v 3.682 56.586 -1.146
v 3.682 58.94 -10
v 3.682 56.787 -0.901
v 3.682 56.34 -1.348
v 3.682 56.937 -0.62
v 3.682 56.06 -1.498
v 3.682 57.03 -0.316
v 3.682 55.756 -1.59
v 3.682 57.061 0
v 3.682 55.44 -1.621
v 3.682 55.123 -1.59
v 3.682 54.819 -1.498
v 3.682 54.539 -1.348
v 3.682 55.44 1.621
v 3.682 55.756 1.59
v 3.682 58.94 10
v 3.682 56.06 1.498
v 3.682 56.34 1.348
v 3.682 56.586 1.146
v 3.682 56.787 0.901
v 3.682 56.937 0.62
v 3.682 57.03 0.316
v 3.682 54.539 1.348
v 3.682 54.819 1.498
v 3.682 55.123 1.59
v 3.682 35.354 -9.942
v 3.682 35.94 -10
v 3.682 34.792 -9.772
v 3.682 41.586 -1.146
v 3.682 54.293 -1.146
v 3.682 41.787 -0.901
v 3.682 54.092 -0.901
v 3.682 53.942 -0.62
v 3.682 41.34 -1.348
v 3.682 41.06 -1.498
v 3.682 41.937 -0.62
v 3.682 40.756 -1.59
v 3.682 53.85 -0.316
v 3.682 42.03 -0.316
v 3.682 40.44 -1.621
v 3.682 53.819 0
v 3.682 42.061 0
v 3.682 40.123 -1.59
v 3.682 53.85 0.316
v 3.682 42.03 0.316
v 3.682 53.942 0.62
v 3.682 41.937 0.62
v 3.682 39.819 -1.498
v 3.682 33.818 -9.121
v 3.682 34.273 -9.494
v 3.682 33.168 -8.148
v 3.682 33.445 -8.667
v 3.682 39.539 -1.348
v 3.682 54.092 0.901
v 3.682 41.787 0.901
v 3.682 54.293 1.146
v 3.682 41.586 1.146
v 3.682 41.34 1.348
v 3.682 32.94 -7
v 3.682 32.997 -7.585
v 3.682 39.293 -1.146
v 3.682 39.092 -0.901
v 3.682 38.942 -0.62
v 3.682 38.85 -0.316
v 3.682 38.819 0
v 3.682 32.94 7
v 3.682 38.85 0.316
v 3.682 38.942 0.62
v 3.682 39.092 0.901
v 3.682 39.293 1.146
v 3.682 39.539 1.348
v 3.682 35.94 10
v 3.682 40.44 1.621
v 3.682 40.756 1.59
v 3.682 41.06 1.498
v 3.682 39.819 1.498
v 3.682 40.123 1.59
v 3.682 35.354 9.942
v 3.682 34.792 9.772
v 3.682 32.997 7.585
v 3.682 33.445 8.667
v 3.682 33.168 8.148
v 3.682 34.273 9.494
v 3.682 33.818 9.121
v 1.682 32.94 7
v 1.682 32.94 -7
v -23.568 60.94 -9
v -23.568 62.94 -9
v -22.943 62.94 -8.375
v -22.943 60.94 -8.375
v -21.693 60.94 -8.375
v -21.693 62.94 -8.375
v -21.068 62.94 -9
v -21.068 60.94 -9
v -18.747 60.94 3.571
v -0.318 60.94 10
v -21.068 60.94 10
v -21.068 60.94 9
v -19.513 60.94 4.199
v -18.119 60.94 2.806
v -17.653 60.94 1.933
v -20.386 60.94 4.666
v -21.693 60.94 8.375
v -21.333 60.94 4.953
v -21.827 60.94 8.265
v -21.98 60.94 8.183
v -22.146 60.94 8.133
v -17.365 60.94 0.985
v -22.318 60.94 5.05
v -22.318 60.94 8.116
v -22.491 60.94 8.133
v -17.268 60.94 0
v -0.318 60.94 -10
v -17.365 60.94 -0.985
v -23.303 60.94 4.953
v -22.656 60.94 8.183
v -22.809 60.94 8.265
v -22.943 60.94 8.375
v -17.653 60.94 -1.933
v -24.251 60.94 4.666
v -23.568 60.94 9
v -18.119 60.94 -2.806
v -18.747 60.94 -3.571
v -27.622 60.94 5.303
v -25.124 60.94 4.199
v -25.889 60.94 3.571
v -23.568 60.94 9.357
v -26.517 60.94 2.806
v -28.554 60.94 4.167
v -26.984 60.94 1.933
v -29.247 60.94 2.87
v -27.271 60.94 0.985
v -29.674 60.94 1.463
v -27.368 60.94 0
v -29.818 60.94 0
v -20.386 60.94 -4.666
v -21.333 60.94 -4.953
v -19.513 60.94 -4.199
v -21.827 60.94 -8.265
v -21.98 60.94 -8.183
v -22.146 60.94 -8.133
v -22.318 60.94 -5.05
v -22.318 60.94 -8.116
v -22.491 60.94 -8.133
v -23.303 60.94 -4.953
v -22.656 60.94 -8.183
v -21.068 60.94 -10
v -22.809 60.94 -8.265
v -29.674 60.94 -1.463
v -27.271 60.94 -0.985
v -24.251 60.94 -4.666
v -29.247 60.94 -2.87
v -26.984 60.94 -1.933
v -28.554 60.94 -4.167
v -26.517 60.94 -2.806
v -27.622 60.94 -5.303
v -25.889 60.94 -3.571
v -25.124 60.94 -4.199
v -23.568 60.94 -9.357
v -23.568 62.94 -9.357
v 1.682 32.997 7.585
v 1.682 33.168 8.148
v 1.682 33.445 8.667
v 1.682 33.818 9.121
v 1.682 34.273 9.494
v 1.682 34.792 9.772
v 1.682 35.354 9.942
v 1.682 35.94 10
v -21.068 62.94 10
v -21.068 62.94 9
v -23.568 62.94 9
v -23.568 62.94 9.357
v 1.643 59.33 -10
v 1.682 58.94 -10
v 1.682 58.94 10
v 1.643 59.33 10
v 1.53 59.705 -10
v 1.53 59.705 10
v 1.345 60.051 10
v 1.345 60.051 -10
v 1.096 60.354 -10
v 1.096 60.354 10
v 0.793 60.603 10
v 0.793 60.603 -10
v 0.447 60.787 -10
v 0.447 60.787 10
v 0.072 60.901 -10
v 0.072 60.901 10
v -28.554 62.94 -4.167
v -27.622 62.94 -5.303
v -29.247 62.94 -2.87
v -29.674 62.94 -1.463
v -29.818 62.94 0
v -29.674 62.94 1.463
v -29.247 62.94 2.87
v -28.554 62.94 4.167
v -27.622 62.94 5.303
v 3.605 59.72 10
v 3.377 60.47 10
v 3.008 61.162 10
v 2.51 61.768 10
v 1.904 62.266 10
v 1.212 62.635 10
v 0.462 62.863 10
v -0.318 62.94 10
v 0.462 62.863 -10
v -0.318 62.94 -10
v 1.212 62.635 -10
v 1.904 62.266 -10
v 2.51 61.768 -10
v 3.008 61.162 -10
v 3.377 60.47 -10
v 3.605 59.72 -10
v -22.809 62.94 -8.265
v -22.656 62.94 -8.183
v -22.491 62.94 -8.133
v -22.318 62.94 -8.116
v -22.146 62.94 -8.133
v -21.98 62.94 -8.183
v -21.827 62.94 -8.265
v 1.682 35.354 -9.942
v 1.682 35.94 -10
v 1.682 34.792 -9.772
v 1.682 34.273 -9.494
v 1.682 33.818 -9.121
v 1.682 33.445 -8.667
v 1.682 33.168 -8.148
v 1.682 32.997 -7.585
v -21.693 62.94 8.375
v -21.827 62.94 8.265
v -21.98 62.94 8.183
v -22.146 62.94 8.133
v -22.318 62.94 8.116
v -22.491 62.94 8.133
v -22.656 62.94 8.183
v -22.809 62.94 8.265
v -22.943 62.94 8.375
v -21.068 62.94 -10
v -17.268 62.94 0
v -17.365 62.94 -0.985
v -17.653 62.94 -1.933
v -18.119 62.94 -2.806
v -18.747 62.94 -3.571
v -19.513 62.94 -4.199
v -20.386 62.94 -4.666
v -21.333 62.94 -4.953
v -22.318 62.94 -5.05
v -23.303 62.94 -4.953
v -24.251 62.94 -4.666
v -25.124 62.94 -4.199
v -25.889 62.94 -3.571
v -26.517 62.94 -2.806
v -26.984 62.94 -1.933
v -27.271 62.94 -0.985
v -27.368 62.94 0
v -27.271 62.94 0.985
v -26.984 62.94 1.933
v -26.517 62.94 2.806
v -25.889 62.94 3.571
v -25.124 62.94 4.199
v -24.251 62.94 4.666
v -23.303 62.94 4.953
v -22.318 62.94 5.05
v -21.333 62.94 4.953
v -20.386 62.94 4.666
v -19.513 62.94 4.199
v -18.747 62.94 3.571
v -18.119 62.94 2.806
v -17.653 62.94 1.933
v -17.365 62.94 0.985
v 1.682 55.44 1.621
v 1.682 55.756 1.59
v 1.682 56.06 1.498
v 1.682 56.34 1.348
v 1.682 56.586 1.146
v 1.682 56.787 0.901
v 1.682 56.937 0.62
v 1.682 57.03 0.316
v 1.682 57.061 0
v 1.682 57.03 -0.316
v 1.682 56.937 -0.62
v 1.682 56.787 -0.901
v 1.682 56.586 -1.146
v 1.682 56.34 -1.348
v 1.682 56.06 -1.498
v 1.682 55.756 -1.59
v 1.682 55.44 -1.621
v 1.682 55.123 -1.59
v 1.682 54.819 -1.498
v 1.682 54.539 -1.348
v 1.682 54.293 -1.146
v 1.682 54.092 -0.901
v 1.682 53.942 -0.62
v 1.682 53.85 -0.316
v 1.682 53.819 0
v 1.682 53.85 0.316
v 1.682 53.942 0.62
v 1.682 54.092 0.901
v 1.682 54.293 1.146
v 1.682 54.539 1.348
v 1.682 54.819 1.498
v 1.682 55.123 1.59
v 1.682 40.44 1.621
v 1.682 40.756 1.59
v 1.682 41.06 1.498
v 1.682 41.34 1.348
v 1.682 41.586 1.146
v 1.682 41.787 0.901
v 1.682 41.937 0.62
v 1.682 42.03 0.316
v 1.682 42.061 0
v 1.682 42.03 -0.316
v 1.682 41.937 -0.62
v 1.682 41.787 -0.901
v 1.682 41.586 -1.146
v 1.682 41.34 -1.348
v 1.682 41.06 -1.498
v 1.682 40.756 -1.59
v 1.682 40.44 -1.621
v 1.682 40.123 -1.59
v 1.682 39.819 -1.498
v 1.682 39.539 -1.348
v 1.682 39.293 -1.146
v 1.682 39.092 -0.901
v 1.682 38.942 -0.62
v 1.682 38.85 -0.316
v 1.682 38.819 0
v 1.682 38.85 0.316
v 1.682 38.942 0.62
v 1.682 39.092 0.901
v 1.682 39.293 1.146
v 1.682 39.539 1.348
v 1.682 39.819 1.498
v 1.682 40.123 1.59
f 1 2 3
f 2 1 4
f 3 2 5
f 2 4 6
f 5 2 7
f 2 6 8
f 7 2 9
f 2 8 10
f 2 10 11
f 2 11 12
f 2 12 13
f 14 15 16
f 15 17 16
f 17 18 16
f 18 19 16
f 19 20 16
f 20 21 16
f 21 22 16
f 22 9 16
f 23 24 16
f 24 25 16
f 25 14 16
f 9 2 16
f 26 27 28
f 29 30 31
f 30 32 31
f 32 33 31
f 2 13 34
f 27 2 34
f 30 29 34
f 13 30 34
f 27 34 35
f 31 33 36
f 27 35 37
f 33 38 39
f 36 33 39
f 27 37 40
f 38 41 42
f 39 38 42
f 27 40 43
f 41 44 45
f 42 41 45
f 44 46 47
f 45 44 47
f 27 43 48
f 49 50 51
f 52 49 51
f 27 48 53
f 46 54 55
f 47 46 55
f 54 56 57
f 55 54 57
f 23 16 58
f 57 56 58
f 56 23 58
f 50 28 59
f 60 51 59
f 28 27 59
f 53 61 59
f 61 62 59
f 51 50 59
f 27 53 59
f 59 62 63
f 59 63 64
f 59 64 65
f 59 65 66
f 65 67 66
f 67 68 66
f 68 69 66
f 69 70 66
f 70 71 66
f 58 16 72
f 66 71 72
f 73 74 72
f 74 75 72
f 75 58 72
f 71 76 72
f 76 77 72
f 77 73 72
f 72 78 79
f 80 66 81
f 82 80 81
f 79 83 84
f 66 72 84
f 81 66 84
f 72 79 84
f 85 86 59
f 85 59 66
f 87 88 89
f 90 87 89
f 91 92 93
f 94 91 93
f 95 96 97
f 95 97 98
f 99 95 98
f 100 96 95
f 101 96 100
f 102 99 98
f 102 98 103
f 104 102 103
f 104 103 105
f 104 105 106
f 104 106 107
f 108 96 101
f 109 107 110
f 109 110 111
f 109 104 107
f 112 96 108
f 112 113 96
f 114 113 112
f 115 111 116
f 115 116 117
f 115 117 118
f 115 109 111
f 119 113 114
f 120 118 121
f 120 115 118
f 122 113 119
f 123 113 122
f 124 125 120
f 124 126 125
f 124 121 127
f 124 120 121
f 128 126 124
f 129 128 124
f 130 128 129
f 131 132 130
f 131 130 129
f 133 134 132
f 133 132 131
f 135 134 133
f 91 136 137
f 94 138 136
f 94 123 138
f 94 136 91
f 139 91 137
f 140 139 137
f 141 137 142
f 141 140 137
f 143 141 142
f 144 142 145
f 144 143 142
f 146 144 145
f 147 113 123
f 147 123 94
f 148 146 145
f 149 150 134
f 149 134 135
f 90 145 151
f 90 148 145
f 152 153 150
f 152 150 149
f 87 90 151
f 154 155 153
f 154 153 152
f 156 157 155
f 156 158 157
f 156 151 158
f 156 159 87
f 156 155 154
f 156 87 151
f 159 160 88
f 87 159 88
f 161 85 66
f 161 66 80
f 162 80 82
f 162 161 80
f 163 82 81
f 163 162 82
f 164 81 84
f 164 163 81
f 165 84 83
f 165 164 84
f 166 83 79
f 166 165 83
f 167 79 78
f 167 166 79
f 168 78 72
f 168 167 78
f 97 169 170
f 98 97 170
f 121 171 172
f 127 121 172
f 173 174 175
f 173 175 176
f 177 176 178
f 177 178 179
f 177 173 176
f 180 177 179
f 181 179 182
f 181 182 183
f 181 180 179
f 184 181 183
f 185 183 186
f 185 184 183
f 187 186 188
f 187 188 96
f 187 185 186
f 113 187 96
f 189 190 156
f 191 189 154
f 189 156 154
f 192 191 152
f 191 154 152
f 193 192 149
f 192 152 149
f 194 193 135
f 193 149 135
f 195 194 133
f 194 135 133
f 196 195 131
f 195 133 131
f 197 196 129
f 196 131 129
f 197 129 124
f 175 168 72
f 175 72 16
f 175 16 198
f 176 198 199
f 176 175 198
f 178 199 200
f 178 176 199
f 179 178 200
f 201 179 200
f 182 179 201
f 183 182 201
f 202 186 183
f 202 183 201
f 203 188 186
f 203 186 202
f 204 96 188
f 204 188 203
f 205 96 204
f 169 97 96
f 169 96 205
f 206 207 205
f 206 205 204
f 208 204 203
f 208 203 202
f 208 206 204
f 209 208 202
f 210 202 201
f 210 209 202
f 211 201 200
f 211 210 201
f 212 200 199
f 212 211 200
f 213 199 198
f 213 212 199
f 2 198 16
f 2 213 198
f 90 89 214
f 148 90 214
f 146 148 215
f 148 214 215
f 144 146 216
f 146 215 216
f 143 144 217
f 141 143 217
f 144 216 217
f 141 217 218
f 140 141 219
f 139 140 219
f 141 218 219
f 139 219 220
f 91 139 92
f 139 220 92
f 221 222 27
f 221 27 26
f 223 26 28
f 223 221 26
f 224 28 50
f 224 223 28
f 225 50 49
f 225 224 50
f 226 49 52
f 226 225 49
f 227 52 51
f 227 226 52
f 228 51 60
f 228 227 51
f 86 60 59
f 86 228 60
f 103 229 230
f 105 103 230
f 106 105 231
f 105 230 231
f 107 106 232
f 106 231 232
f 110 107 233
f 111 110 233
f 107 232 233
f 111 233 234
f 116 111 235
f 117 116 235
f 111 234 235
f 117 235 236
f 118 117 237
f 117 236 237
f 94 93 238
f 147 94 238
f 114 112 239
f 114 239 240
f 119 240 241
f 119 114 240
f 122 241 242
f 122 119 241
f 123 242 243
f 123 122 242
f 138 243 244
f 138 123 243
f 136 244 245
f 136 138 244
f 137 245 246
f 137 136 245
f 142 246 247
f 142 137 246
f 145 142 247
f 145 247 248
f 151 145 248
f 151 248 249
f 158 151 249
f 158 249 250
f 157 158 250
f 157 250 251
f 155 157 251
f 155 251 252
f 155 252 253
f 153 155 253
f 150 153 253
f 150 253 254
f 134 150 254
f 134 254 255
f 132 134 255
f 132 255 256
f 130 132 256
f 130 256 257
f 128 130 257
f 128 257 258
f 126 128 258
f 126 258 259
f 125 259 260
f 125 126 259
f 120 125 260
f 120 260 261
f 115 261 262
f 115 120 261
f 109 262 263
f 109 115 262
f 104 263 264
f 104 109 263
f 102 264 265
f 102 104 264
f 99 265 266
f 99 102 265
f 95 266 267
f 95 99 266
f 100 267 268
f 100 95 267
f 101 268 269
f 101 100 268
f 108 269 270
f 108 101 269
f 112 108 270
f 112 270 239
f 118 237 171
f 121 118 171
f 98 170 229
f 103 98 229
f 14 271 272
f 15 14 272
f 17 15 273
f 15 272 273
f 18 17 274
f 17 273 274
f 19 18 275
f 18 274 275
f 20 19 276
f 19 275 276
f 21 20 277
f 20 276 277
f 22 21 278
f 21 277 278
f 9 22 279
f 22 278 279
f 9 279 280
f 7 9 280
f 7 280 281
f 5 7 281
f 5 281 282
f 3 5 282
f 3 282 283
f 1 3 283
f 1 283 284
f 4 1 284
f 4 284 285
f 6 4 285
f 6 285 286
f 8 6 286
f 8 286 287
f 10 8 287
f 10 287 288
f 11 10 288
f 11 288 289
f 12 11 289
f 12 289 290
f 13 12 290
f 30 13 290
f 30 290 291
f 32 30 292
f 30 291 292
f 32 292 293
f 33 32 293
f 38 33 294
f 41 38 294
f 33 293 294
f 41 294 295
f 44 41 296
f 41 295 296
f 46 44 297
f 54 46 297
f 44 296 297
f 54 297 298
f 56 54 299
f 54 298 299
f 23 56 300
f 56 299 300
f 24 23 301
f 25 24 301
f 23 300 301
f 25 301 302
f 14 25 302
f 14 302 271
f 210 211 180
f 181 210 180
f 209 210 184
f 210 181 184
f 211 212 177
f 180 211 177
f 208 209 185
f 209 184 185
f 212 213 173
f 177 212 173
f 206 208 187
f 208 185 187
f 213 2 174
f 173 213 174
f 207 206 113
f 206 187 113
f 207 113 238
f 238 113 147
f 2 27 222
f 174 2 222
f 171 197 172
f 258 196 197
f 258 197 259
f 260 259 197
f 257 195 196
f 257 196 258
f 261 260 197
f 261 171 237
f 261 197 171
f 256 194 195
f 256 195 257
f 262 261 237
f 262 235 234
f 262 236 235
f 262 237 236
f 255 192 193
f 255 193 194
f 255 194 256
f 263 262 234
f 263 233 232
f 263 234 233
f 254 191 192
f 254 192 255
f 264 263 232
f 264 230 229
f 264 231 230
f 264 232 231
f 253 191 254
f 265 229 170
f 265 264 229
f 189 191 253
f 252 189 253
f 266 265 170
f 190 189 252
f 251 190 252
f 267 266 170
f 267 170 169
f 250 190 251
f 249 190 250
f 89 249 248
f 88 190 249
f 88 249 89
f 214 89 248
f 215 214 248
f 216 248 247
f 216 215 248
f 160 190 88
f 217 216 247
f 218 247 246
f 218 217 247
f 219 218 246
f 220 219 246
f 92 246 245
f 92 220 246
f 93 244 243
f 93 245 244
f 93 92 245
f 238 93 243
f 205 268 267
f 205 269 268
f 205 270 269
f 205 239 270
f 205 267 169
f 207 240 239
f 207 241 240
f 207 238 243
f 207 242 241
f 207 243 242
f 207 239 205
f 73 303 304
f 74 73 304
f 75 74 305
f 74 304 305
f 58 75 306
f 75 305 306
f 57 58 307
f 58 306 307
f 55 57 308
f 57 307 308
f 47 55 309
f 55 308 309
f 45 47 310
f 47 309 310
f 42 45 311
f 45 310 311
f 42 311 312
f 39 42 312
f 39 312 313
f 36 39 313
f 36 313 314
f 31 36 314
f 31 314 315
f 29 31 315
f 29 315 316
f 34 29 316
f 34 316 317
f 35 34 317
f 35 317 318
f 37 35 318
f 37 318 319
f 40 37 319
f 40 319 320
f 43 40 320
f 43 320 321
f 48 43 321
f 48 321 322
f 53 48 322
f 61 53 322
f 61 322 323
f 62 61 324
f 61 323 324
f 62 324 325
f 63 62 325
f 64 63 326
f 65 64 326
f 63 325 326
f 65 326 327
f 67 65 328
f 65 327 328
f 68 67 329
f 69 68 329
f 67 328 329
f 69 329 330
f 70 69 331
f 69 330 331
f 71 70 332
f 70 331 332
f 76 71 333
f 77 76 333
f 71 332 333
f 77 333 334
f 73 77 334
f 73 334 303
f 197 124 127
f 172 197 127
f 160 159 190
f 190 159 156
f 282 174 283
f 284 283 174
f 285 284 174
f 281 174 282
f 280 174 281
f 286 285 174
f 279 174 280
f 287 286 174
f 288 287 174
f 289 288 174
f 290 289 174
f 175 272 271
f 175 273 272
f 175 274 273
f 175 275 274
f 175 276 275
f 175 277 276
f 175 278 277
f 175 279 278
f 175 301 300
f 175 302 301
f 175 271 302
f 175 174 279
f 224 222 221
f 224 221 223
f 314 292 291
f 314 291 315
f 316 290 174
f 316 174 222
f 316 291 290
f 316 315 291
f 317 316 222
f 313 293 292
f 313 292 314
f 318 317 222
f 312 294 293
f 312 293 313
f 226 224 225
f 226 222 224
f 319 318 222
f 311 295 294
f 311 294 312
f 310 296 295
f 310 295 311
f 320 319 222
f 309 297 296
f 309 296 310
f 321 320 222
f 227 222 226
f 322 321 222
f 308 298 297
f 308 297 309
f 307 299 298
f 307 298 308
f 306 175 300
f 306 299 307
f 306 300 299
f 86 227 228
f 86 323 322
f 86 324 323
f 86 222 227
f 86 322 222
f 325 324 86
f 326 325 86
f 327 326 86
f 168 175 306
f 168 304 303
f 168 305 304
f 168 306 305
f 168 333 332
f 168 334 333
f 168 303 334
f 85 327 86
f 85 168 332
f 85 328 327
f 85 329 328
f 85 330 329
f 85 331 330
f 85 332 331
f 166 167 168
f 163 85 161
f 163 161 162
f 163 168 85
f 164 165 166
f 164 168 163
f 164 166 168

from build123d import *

# Parameters (mm, degrees)
BOSS_EXTRUDE1_DEPTH        = 2
M3_CLEARANCE_HOLE1_D       = 3.242
HOLE1_D                    = 10.1
SKETCHED_START             = 62.517190459
SKETCHED_BEND1_OUTLINE_W   = 2
SKETCHED_BEND1_OUTLINE_H   = 20.000000002
SKETCHED_BEND1_DEPTH       = 31.482809541
SKETCHED_START_2           = 60.939670459
SKETCHED_BEND1_2_OUTLINE_R = 5.05
SKETCHED_BEND1_2_DEPTH     = 0.021621314
SKETCHED_START_3           = 58.939670459
SKETCHED_BEND1_3_OUTLINE_R = 5.05
SKETCHED_BEND1_3_DEPTH     = 4
SKETCHED_START_4           = -10.000000001
SKETCHED_BEND1_4_DEPTH     = 20.000000002
CUT_EXTRUDE1_REACH         = 45.464


with BuildPart() as part:
    # Sketch5 → Boss-Extrude1 (new body)
    with BuildSketch(Plane(origin=(1.681750162, 0, 0), x_dir=(0, -1, 0), z_dir=(-1, 0, 0))):
        with BuildLine():
            Line((-35.93967046, 10.000000001), (-86.258661155, 10.000000001))
            Line((-86.258661155, 10.000000001), (-90.955360298, 5.303300858))
            ThreePointArc((-90.955360298, 5.303300858), (-93.152059438, 0), (-90.955360298, -5.303300858))
            Line((-90.955360298, -5.303300858), (-86.258661155, -10.000000001))
            Line((-86.258661155, -10.000000001), (-35.93967046, -10.000000001))
            ThreePointArc((-35.93967046, -10.000000001), (-33.818350116, -9.121320344), (-32.93967046, -7.000000001))
            Line((-32.93967046, -7.000000001), (-32.93967046, 7.000000001))
            ThreePointArc((-32.93967046, 7.000000001), (-33.818350116, 9.121320344), (-35.93967046, 10.000000001))
        make_face()
    extrude(amount=-BOSS_EXTRUDE1_DEPTH)

    # M3 Clearance Hole1 (through all)
    with Locations(Plane(origin=(3.681750162, 0, 0), x_dir=(0, 0, -1), z_dir=(1, 0, 0))):
        with Locations((0, 40.439670459), (0, 55.439670459)):
            Hole(M3_CLEARANCE_HOLE1_D / 2)

    # Hole1 (through all)
    with Locations(Plane.ZY.offset(-1.681750162)):
        with Locations((0, 85.65205944)):
            Hole(HOLE1_D / 2)

    # Sketched Bend1: read off the stored shape, not the designer's step
    # Sketched Bend1 outline → Sketched Bend1 (cut)
    with BuildSketch(Plane(origin=(0, 0, 0), x_dir=(1, 0, 0), z_dir=(0, 1, 0)).offset(SKETCHED_START)):
        with Locations((2.681750162, 0)):
            Rectangle(SKETCHED_BEND1_OUTLINE_W, SKETCHED_BEND1_OUTLINE_H)
    extrude(amount=SKETCHED_BEND1_DEPTH, mode=Mode.SUBTRACT)

    # Sketched Bend1 2 outline → Sketched Bend1 2 (add)
    with BuildSketch(Plane(origin=(0, 0, 0), x_dir=(1, 0, 0), z_dir=(0, 1, 0)).offset(SKETCHED_START_2)):
        with BuildLine():
            Line((1.681750162, 10.000000001), (-22.924851553, 10.000000001))
            Line((-22.924851553, 10.000000001), (-27.621550696, 5.303300858))
            ThreePointArc((-27.621550696, 5.303300858), (-29.818249837, 0), (-27.621550696, -5.303300858))
            Line((-27.621550696, -5.303300858), (-22.924851553, -10.000000001))
            Line((-22.924851553, -10.000000001), (1.681750162, -10.000000001))
            Line((1.681750162, -10.000000001), (1.681750162, 10.000000001))
        make_face()
        with Locations((-22.318249838, 0)):
            Circle(SKETCHED_BEND1_2_OUTLINE_R, mode=Mode.SUBTRACT)
    extrude(amount=SKETCHED_BEND1_2_DEPTH)

    # Sketched Bend1 3 outline → Sketched Bend1 3 (add)
    with BuildSketch(Plane(origin=(0, 0, 0), x_dir=(1, 0, 0), z_dir=(0, 1, 0)).offset(SKETCHED_START_3)):
        with BuildLine():
            Line((1.681750162, 10.000000001), (-22.924851553, 10.000000001))
            Line((-22.924851553, 10.000000001), (-27.621550696, 5.303300858))
            ThreePointArc((-27.621550696, 5.303300858), (-29.818249837, 0), (-27.621550696, -5.303300858))
            Line((-27.621550696, -5.303300858), (-22.924851553, -10.000000001))
            Line((-22.924851553, -10.000000001), (1.681750162, -10.000000001))
            Line((1.681750162, -10.000000001), (1.681750162, 10.000000001))
        make_face()
        with Locations((-22.318249838, 0)):
            Circle(SKETCHED_BEND1_3_OUTLINE_R, mode=Mode.SUBTRACT)
    extrude(amount=SKETCHED_BEND1_3_DEPTH)

    # Sketched Bend1 4 outline → Sketched Bend1 4 (cut)
    with BuildSketch(Plane.XY.offset(SKETCHED_START_4)):
        with BuildLine():
            Line((-0.318249838, 60.939670459), (-31, 60.939670459))
            Line((-31, 60.939670459), (-31, 58.939670459))
            Line((-31, 58.939670459), (1.681750162, 58.939670459))
            ThreePointArc((1.681750162, 58.939670459), (1.095963724, 60.353884021), (-0.318249838, 60.939670459))
        make_face()
        with BuildLine():
            Line((-31, 64), (-31, 62.939670452))
            Line((-31, 62.939670452), (-0.318249838, 62.939670459))
            ThreePointArc((-0.318249838, 62.939670459), (2.510177287, 61.768097584), (3.681750162, 58.939670459))
            Line((3.681750162, 58.939670459), (3.681750162, 62.517190459))
            Line((3.681750162, 62.517190459), (1.681750162, 62.517190459))
            Line((1.681750162, 62.517190459), (1.681750162, 64))
            Line((1.681750162, 64), (-31, 64))
        make_face()
    extrude(amount=SKETCHED_BEND1_4_DEPTH, mode=Mode.SUBTRACT)

    # Sketch15 → Cut-Extrude1 (cut, up to next)
    with BuildSketch(Plane(origin=(0, 62.939670459, 0), x_dir=(1, 0, 0), z_dir=(0, 1, 0)), mode=Mode.PRIVATE) as cut_extrude1_sk1:
        with BuildLine():
            Line((-21.068249838, 9.000000001), (-21.068249838, 10.000000001))
            Line((-21.068249838, 10.000000001), (-22.924851553, 10.000000001))
            Line((-22.924851553, 10.000000001), (-23.568249838, 9.356601716))
            Line((-23.568249838, 9.356601716), (-23.568249838, 9.000000001))
            Line((-23.568249838, 9.000000001), (-22.943249838, 8.375000001))
            ThreePointArc((-22.943249838, 8.375000001), (-22.318249838, 8.116116524), (-21.693249838, 8.375000001))
            Line((-21.693249838, 8.375000001), (-21.068249838, 9.000000001))
        make_face()
    cut_extrude1_tool1 = extrude(cut_extrude1_sk1.sketch, amount=-CUT_EXTRUDE1_REACH, mode=Mode.PRIVATE) & part.part
    # Sketch15 → Cut-Extrude1 (cut, up to next)
    with BuildSketch(Plane(origin=(0, 62.939670459, 0), x_dir=(1, 0, 0), z_dir=(0, 1, 0)), mode=Mode.PRIVATE) as cut_extrude1_sk2:
        with BuildLine():
            Line((-21.068249838, -9.000000001), (-21.693249838, -8.375000001))
            ThreePointArc((-21.693249838, -8.375000001), (-22.318249838, -8.116116524), (-22.943249838, -8.375000001))
            Line((-22.943249838, -8.375000001), (-23.568249838, -9.000000001))
            Line((-23.568249838, -9.000000001), (-23.568249838, -9.356601716))
            Line((-23.568249838, -9.356601716), (-22.924851553, -10.000000001))
            Line((-22.924851553, -10.000000001), (-21.068249838, -10.000000001))
            Line((-21.068249838, -10.000000001), (-21.068249838, -9.000000001))
        make_face()
    cut_extrude1_tool2 = extrude(cut_extrude1_sk2.sketch, amount=-CUT_EXTRUDE1_REACH, mode=Mode.PRIVATE) & part.part
    add(cut_extrude1_tool1.solids().sort_by_distance((-22.260131, 62.93967, -9.16246))[0], mode=Mode.SUBTRACT)
    add(cut_extrude1_tool2.solids().sort_by_distance((-22.260131, 62.93967, 9.16246))[0], mode=Mode.SUBTRACT)


solid = part.part
